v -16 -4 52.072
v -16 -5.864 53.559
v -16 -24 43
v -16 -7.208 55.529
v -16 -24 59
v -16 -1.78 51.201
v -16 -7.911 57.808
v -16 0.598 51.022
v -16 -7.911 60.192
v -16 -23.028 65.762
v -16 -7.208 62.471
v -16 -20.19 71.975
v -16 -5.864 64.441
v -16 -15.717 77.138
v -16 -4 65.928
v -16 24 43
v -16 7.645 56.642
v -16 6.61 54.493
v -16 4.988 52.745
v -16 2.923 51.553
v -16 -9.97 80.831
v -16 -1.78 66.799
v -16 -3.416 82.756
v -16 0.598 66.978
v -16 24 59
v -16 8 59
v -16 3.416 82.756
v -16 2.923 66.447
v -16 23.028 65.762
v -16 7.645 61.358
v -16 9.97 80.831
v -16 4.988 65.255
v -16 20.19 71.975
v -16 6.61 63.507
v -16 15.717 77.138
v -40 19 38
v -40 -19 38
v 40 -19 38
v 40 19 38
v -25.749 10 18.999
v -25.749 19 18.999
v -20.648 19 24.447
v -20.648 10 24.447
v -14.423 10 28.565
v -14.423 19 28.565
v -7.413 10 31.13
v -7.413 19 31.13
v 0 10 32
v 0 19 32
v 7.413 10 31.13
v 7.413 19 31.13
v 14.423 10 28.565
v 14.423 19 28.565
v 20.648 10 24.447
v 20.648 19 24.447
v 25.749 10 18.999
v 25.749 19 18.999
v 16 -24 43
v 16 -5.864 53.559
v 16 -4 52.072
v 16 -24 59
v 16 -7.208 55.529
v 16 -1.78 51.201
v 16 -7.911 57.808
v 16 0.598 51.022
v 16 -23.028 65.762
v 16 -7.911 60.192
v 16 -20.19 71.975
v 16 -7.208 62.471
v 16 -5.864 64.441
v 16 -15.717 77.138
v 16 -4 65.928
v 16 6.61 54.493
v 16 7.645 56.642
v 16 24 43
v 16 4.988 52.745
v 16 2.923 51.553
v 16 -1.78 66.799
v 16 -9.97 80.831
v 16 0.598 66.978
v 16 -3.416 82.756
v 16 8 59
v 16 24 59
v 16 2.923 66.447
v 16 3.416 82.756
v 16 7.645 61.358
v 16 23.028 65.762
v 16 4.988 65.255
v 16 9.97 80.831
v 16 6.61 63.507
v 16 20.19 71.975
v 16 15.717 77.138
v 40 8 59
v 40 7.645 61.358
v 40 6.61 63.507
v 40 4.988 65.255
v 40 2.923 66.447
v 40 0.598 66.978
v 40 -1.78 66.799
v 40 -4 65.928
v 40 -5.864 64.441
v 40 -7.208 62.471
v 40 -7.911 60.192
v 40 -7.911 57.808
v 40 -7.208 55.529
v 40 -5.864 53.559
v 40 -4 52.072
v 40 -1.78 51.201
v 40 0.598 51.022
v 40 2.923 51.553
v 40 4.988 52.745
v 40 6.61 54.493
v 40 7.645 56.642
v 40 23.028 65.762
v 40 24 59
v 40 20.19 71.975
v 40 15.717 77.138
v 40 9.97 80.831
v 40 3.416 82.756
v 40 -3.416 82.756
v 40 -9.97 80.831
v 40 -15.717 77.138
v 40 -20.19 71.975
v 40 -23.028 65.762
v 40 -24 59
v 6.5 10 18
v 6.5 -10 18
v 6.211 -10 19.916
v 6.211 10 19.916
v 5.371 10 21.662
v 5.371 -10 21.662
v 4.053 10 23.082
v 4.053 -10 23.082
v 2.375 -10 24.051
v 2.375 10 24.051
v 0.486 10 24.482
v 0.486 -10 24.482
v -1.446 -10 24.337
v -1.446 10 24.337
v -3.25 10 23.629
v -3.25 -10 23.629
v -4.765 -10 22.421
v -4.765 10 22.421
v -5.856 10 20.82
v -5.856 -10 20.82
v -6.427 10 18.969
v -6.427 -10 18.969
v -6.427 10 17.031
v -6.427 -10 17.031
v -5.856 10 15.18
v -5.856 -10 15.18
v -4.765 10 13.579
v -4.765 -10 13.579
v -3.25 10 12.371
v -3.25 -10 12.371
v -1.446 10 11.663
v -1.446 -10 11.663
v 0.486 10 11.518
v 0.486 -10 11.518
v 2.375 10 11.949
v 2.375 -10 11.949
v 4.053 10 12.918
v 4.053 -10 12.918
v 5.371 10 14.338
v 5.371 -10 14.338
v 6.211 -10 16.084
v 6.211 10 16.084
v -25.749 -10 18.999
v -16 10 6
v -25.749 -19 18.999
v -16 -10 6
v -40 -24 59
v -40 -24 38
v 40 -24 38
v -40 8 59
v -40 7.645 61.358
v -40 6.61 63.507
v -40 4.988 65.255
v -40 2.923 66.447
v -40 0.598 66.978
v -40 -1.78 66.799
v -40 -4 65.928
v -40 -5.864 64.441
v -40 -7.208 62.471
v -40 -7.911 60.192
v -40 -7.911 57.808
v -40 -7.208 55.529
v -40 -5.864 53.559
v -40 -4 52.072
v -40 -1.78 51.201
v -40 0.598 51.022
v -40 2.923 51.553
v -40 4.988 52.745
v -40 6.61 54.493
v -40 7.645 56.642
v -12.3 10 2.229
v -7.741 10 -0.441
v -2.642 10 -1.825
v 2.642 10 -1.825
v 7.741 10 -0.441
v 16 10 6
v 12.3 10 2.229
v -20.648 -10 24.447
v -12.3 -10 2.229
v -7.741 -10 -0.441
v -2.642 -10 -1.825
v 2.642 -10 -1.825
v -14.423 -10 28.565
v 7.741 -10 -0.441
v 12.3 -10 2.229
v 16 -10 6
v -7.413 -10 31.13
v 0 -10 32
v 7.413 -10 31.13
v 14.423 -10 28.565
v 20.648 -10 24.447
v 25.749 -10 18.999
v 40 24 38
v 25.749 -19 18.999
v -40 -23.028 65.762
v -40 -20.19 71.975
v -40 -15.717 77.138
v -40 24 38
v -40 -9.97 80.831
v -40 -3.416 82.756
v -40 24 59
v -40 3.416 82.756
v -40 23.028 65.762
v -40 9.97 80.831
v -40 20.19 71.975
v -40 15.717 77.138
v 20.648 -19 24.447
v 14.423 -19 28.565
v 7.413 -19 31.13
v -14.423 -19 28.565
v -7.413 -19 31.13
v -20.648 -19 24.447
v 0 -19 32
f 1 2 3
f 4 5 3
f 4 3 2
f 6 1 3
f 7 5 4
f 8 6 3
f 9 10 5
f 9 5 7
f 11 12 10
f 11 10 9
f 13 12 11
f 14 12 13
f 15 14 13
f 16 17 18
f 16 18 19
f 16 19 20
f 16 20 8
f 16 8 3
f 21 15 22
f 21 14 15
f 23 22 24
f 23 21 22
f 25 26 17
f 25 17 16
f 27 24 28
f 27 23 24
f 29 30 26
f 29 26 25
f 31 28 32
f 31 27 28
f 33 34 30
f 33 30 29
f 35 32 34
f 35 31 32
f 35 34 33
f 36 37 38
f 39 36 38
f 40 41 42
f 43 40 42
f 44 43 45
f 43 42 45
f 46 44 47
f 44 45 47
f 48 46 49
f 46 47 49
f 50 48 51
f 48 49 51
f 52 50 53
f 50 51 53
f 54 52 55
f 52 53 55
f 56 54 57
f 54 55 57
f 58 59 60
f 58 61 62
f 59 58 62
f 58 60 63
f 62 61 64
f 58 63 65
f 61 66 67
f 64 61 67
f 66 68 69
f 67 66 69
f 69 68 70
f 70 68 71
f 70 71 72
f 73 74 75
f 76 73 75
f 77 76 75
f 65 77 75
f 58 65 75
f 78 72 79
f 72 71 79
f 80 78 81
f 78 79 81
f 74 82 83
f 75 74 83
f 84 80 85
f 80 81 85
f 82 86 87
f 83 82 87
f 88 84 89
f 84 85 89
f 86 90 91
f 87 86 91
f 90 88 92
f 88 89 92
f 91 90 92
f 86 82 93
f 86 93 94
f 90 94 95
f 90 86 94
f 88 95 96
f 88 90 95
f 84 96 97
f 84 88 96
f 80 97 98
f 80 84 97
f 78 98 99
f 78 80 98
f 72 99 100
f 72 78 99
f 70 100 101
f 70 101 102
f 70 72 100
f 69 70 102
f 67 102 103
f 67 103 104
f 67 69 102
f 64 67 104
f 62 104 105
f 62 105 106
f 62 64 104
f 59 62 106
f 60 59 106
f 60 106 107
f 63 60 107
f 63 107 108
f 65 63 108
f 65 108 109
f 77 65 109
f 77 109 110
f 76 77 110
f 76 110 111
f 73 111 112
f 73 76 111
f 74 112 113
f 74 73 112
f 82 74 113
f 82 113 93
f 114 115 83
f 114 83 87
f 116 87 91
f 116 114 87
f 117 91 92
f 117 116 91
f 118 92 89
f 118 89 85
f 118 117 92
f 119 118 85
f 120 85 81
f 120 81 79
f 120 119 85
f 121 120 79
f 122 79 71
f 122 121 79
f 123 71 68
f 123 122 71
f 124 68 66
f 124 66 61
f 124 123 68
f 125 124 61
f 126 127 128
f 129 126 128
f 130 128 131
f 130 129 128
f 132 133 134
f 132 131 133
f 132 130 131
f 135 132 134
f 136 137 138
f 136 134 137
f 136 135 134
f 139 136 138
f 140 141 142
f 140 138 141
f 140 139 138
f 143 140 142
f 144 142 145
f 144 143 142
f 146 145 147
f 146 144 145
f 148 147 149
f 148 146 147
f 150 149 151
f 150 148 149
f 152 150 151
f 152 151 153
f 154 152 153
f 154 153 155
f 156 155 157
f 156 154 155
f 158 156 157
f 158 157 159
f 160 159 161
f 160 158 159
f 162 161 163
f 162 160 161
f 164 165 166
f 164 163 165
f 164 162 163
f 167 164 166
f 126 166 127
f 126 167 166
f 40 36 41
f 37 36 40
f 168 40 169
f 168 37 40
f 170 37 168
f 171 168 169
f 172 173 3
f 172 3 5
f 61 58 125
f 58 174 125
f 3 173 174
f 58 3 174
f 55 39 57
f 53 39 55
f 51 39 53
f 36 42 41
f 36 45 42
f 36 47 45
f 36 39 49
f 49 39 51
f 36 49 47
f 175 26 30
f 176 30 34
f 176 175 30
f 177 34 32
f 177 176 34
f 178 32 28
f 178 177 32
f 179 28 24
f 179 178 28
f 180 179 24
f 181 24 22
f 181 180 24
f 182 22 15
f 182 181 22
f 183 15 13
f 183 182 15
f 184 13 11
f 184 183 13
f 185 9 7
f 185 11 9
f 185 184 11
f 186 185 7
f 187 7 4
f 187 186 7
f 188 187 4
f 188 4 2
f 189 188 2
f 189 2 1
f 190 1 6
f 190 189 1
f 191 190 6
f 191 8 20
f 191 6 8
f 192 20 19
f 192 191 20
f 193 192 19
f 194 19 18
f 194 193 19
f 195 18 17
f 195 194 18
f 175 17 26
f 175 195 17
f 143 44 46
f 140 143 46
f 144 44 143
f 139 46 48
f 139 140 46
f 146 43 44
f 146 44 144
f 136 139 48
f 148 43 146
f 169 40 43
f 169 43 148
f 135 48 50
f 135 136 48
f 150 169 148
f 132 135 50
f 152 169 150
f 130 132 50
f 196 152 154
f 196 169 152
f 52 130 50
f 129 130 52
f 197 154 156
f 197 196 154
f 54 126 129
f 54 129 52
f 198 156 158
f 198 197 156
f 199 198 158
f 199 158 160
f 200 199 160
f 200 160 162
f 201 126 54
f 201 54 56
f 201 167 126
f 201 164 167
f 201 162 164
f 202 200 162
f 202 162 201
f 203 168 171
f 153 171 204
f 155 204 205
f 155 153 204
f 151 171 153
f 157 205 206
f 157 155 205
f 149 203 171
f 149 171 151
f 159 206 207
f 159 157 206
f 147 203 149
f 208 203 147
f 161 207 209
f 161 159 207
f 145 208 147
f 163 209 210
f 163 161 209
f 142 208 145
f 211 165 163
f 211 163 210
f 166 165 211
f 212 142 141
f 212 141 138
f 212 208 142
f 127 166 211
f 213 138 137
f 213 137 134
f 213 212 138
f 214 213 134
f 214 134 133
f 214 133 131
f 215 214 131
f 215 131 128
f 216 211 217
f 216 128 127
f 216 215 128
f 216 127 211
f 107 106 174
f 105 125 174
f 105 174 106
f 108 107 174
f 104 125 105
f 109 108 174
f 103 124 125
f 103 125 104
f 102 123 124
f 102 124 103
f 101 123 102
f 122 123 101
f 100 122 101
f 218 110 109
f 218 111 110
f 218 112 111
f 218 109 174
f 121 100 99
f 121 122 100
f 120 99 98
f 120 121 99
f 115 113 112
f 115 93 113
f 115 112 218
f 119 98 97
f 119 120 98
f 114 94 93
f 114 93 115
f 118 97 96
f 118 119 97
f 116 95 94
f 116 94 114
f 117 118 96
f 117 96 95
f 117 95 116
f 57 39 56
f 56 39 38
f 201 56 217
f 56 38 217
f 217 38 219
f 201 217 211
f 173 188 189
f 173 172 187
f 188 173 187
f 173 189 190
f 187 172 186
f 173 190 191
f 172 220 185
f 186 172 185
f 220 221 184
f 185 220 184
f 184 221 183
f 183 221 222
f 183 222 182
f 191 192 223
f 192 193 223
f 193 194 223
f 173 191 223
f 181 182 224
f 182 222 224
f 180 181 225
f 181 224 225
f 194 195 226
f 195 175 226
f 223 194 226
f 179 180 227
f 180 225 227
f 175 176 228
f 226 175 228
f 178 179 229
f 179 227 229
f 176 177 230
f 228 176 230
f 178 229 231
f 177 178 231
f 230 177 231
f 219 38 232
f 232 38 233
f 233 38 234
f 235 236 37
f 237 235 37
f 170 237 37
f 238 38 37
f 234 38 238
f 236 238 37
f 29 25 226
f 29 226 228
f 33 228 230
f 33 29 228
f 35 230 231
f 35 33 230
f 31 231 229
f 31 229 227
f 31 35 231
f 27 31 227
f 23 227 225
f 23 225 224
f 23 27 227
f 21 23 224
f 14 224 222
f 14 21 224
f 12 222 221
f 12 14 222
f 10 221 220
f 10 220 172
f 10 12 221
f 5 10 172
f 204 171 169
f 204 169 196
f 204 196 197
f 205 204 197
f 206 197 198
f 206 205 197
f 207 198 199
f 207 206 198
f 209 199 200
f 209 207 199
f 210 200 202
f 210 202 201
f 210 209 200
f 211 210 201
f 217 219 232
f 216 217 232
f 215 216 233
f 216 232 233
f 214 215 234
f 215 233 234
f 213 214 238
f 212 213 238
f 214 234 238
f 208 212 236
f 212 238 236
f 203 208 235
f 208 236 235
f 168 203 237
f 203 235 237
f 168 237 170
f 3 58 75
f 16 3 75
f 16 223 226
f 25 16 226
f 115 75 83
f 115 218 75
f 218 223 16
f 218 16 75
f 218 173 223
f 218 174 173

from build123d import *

# Parameters (mm, degrees)
SKETCH001_W     = 56.994616
SKETCH001_H     = 47.06926
PAD001_DEPTH    = 16
SKETCH_R        = 8
PAD_DEPTH       = 40
SKETCH002_R     = 6.5
PAD002_DEPTH    = 19
POCKET_DEPTH    = 9
POCKET001_DEPTH = 9


with BuildPart() as pad001:
    # Sketch001 → Pad001 (new body, symmetric)
    with BuildSketch(Plane.YZ):
        with Locations((0.044112, 66.53463)):
            Rectangle(SKETCH001_W, SKETCH001_H)
    extrude(amount=PAD001_DEPTH, both=True)


with BuildPart() as cut:
    # Sketch → Pad (new body, symmetric)
    with BuildSketch(Plane.YZ):
        with BuildLine():
            Line((-24, 38), (24, 38))
            Line((24, 38), (24, 59.000043))
            ThreePointArc((24, 59.000043), (-2.1e-05, 83), (-24, 59))
            Line((-24, 38), (-24, 59))
        make_face()
        with Locations((0, 59)):
            Circle(SKETCH_R, mode=Mode.SUBTRACT)
    extrude(amount=PAD_DEPTH, both=True)

    # Cut: cut Pad001
    add(pad001.part, mode=Mode.SUBTRACT)


with BuildPart() as pocket001:
    # Sketch002 → Pad002 (new body, symmetric)
    with BuildSketch(Plane.XZ):
        with BuildLine():
            Line((-40, 38), (40, 38))
            Line((40, 38), (16.000031, 6.000041))
            ThreePointArc((-16.000031, 6.000041), (0, -2), (16.000031, 6.000041))
            Line((-40, 38), (-16.000031, 6.000041))
        make_face()
        with Locations((0, 18)):
            Circle(SKETCH002_R, mode=Mode.SUBTRACT)
    extrude(amount=PAD002_DEPTH, both=True)

    # Sketch003 → Pocket (cut)
    with BuildSketch(Plane.XZ.offset(19)):
        with BuildLine():
            ThreePointArc((30.074504, -10.932713), (0, 32), (-30.074504, -10.932713))
            Line((-30.074504, -10.932713), (30.074504, -10.932713))
        make_face()
    extrude(amount=-POCKET_DEPTH, mode=Mode.SUBTRACT)

    # Sketch004 → Pocket001 (cut)
    with BuildSketch(Plane(origin=(0, 19, 0), x_dir=(1, 0, 0), z_dir=(0, 1, 0))):
        with BuildLine():
            ThreePointArc((-29.605592, 12.145325), (-2.707603, -31.885246), (31.229606, 6.979376))
            Line((31.229606, 6.979376), (-29.605592, 12.145325))
        make_face()
    extrude(amount=-POCKET001_DEPTH, mode=Mode.SUBTRACT)


solid = Compound([cut.part, pocket001.part])
